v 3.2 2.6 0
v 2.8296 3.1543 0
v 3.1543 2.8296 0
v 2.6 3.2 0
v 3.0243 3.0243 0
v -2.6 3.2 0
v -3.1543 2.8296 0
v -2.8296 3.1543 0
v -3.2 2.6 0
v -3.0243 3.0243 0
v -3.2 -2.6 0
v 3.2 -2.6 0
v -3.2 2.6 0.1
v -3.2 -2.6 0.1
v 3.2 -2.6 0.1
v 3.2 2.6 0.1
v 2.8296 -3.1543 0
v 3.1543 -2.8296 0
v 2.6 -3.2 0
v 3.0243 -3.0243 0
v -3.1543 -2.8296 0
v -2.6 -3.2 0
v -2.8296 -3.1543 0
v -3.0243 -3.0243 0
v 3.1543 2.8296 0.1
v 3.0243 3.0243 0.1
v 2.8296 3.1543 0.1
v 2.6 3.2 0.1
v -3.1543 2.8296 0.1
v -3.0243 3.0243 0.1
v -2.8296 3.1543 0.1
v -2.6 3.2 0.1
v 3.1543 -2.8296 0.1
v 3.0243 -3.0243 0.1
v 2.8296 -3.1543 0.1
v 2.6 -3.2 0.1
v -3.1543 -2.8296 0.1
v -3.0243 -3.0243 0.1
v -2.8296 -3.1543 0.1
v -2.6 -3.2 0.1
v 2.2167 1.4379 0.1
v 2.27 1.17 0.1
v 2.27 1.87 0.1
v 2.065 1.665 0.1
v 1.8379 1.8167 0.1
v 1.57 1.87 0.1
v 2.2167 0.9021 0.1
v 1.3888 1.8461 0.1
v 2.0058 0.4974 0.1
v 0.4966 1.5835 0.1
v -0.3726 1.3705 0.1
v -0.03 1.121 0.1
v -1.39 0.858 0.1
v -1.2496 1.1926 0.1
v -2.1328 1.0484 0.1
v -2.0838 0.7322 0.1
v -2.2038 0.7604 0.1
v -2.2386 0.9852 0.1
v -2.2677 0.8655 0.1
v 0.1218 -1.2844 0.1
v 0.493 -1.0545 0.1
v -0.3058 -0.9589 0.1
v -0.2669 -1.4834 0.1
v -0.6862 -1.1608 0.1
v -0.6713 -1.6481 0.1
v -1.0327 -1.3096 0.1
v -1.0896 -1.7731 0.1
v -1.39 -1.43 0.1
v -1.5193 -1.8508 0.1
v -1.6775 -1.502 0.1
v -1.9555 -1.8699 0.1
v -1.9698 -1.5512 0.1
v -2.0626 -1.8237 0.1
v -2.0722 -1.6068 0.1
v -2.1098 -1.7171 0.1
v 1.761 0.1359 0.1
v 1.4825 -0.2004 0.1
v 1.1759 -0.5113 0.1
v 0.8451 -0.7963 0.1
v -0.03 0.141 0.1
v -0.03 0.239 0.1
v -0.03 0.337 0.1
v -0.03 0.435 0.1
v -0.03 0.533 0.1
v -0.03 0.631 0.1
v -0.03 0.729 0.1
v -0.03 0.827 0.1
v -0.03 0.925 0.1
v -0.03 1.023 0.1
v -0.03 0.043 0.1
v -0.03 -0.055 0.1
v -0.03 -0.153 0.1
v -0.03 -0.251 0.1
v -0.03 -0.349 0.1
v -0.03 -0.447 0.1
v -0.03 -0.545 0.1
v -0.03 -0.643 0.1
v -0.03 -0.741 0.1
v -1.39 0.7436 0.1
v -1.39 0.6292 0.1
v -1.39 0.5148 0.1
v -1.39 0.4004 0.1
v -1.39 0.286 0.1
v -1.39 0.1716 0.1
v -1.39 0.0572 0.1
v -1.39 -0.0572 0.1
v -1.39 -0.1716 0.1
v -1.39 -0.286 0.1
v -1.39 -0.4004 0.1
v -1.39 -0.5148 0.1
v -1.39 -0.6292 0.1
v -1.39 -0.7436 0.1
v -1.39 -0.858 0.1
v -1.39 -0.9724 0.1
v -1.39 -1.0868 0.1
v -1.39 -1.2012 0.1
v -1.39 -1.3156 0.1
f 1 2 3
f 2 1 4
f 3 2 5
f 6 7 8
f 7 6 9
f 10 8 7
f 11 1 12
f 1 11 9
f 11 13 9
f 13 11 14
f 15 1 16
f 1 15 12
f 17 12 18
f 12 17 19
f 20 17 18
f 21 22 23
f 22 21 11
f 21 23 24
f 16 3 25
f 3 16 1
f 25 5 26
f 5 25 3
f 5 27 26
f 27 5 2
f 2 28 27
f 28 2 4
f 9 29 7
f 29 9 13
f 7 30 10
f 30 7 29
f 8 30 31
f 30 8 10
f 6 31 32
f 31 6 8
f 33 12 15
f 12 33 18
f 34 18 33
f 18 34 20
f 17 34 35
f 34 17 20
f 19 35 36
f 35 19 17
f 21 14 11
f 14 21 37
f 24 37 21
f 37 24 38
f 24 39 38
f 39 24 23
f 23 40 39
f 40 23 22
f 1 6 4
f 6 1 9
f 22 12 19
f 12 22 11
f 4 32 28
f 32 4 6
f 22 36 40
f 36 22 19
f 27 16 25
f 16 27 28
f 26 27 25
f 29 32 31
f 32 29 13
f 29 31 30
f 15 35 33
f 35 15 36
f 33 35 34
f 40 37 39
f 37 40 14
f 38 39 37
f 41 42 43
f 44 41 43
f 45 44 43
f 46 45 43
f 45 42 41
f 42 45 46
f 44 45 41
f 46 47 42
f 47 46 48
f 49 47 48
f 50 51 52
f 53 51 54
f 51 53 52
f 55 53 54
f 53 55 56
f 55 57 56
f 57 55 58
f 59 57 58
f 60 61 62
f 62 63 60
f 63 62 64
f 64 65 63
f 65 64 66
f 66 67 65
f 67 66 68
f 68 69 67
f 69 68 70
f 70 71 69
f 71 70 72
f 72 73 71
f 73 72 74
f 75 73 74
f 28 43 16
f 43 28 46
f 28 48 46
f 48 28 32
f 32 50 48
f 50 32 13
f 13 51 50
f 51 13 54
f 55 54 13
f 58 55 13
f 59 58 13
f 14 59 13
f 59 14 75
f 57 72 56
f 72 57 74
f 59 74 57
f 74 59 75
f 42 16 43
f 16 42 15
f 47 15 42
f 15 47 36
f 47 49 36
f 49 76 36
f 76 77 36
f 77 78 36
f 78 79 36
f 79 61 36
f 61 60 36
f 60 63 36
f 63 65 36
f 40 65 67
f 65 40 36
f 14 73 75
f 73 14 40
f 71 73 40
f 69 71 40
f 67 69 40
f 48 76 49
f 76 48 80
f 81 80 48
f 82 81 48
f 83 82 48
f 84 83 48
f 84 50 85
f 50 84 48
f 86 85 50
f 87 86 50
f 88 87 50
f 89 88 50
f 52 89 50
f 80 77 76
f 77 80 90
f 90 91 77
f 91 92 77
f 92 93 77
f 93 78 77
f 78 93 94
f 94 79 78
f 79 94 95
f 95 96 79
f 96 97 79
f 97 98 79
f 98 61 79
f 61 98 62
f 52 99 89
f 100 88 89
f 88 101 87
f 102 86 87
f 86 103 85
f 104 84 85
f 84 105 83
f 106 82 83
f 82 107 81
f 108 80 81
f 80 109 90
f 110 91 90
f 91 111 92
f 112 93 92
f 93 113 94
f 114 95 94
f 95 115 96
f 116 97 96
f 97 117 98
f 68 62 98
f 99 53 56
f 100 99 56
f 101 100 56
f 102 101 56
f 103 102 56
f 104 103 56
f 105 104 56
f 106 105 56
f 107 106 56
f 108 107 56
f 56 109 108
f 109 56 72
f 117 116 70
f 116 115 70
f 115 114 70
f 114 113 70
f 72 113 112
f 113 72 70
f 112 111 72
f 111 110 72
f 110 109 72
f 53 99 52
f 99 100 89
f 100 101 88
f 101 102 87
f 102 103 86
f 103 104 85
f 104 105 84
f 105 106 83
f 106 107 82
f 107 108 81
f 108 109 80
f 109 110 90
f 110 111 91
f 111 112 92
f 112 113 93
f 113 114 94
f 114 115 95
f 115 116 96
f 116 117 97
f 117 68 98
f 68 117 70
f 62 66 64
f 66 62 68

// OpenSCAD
// file: ../p/box3u12.scad
use <../lib.scad>
function ldraw_lib__box3u12() = [
// 0 Box with 3 Parallel Faces without Any Edges
// 0 Name: box3u12.dat
// 0 Author: J.C. Tchang [tchang]
// 0 !LDRAW_ORG Primitive UPDATE 2014-02
// 0 !LICENSE Licensed under CC BY 4.0 : see CAreadme.txt
// 
// 0 BFC CERTIFY CCW
  [0,"BFC","CERTIFY"],
  [0,"BFC","CCW"],
// 
// 0 !HISTORY 2014-12-23 [PTadmin] Official Update 2014-02
// 
// 
// 4 16 -1 1 1 1 1 1 1 1 -1 -1 1 -1
  [4,16,-1,1,1,1,1,1,1,1,-1,-1,1,-1],
// 4 16 -1 1 1 -1 0 1 1 0 1 1 1 1
  [4,16,-1,1,1,-1,0,1,1,0,1,1,1,1],
// 4 16 1 1 -1 1 0 -1 -1 0 -1 -1 1 -1
  [4,16,1,1,-1,1,0,-1,-1,0,-1,-1,1,-1],
];
module ldraw_lib__box3u12(step=0, col=false, unit=2/5, alt=false, line=0.2, solid=!$preview)
    makepoly(ldraw_lib__box3u12(), step=step, col=col, unit=unit, alt=alt, line=line, solid=solid);
ldraw_lib__box3u12(line=0.2);
// file: ../p/1-4cyli.scad
use <../lib.scad>
function ldraw_lib__1_4cyli() = [
// 0 Cylinder 0.25
// 0 Name: 1-4cyli.dat
// 0 Author: James Jessiman
// 0 !LDRAW_ORG Primitive UPDATE 2012-01
// 0 !LICENSE Licensed under CC BY 4.0 : see CAreadme.txt
// 
// 0 BFC CERTIFY CCW
  [0,"BFC","CERTIFY"],
  [0,"BFC","CCW"],
// 
// 0 !HISTORY 2002-03-23 [sbliss] Added BFC statement.
// 0 !HISTORY 2002-04-25 [PTadmin] Official Update 2002-02
// 0 !HISTORY 2007-06-22 [PTadmin] Header formatted for Contributor Agreement
// 0 !HISTORY 2008-07-01 [PTadmin] Official Update 2008-01
// 0 !HISTORY 2012-02-16 [Philo] Changed to CCW
// 0 !HISTORY 2012-03-30 [PTadmin] Official Update 2012-01
// 
// 
// 4 16 1 1 0 0.9239 1 0.3827 0.9239 0 0.3827 1 0 0
  [4,16,1,1,0,0.9239,1,0.3827,0.9239,0,0.3827,1,0,0],
// 5 24 1 0 0 1 1 0 0.9239 0 0.3827 1 0 -1
  [5,24,1,0,0,1,1,0,0.9239,0,0.3827,1,0,-1],
// 4 16 0.9239 1 0.3827 0.7071 1 0.7071 0.7071 0 0.7071 0.9239 0 0.3827
  [4,16,0.9239,1,0.3827,0.7071,1,0.7071,0.7071,0,0.7071,0.9239,0,0.3827],
// 5 24 0.9239 0 0.3827 0.9239 1 0.3827 0.7071 0 0.7071 1 0 0
  [5,24,0.9239,0,0.3827,0.9239,1,0.3827,0.7071,0,0.7071,1,0,0],
// 4 16 0.7071 1 0.7071 0.3827 1 0.9239 0.3827 0 0.9239 0.7071 0 0.7071
  [4,16,0.7071,1,0.7071,0.3827,1,0.9239,0.3827,0,0.9239,0.7071,0,0.7071],
// 5 24 0.7071 0 0.7071 0.7071 1 0.7071 0.3827 0 0.9239 0.9239 0 0.3827
  [5,24,0.7071,0,0.7071,0.7071,1,0.7071,0.3827,0,0.9239,0.9239,0,0.3827],
// 4 16 0.3827 1 0.9239 0 1 1 0 0 1 0.3827 0 0.9239
  [4,16,0.3827,1,0.9239,0,1,1,0,0,1,0.3827,0,0.9239],
// 5 24 0.3827 0 0.9239 0.3827 1 0.9239 0 0 1 0.7071 0 0.7071
  [5,24,0.3827,0,0.9239,0.3827,1,0.9239,0,0,1,0.7071,0,0.7071],
// 5 24 0 0 1 0 1 1 0.3827 0 0.9239 -1 0 1
  [5,24,0,0,1,0,1,1,0.3827,0,0.9239,-1,0,1],
];
module ldraw_lib__1_4cyli(step=0, col=false, unit=2/5, alt=false, line=0.2, solid=!$preview)
    makepoly(ldraw_lib__1_4cyli(), step=step, col=col, unit=unit, alt=alt, line=line, solid=solid);
ldraw_lib__1_4cyli(line=0.2);
// file: s/stickerback008x008.scad
use <../../lib.scad>
use <../../p/1-4chrd.scad>
use <../../p/1-4cyli.scad>
use <../../p/box3u12.scad>
function ldraw_lib__s__stickerback008x008() = [
// 0 ~Sticker Back  0.8 x  0.8
// 0 Name: s\stickerback008x008.dat
// 0 Author: Massimo Maso [Sirio]
// 0 !LDRAW_ORG Subpart UPDATE 2025-08
// 0 !LICENSE Licensed under CC BY 4.0 : see CAreadme.txt
// 
// 0 BFC CERTIFY CCW
  [0,"BFC","CERTIFY"],
  [0,"BFC","CCW"],
// 
// 0 !HISTORY 2025-08-31 [OrionP] Official Update 2025-08
// 
// 0 // Primitives
// 1 16 -6.5 0 6.5 -1.5 0 0 0 -1 0 0 0 1.5 1-4chrd.dat
  [1,16,-6.5,0,6.5,-1.5,0,0,0,-1,0,0,0,1.5, ldraw_lib__1_4chrd()],
// 1 16 6.5 0 6.5 1.5 0 0 0 -1 0 0 0 1.5 1-4chrd.dat
  [1,16,6.5,0,6.5,1.5,0,0,0,-1,0,0,0,1.5, ldraw_lib__1_4chrd()],
// 1 16 0 -.25 0 0 0 8 0 .25 0 6.5 0 0 box3u12.dat
  [1,16,0,-.25,0,0,0,8,0,.25,0,6.5,0,0, ldraw_lib__box3u12()],
// 1 16 -6.5 0 -6.5 -1.5 0 0 0 -1 0 0 0 -1.5 1-4chrd.dat
  [1,16,-6.5,0,-6.5,-1.5,0,0,0,-1,0,0,0,-1.5, ldraw_lib__1_4chrd()],
// 1 16 6.5 0 -6.5 1.5 0 0 0 -1 0 0 0 -1.5 1-4chrd.dat
  [1,16,6.5,0,-6.5,1.5,0,0,0,-1,0,0,0,-1.5, ldraw_lib__1_4chrd()],
// 1 16 -6.5 0 6.5 -1.5 0 0 0 -.25 0 0 0 1.5 1-4cyli.dat
  [1,16,-6.5,0,6.5,-1.5,0,0,0,-.25,0,0,0,1.5, ldraw_lib__1_4cyli()],
// 1 16 6.5 0 6.5 1.5 0 0 0 -.25 0 0 0 1.5 1-4cyli.dat
  [1,16,6.5,0,6.5,1.5,0,0,0,-.25,0,0,0,1.5, ldraw_lib__1_4cyli()],
// 1 16 -6.5 0 -6.5 -1.5 0 0 0 -.25 0 0 0 -1.5 1-4cyli.dat
  [1,16,-6.5,0,-6.5,-1.5,0,0,0,-.25,0,0,0,-1.5, ldraw_lib__1_4cyli()],
// 1 16 6.5 0 -6.5 1.5 0 0 0 -.25 0 0 0 -1.5 1-4cyli.dat
  [1,16,6.5,0,-6.5,1.5,0,0,0,-.25,0,0,0,-1.5, ldraw_lib__1_4cyli()],
// 0 // Bottom faces
// 4 16 -8 0 6.5 -6.5 0 8 6.5 0 8 8 0 6.5
  [4,16,-8,0,6.5,-6.5,0,8,6.5,0,8,8,0,6.5],
// 4 16 -8 0 -6.5 8 0 -6.5 6.5 0 -8 -6.5 0 -8
  [4,16,-8,0,-6.5,8,0,-6.5,6.5,0,-8,-6.5,0,-8],
// 0 // Lateral faces
// 4 16 -6.5 0 8 -6.5 -.25 8 6.5 -.25 8 6.5 0 8
  [4,16,-6.5,0,8,-6.5,-.25,8,6.5,-.25,8,6.5,0,8],
// 4 16 -6.5 0 -8 6.5 0 -8 6.5 -.25 -8 -6.5 -.25 -8
  [4,16,-6.5,0,-8,6.5,0,-8,6.5,-.25,-8,-6.5,-.25,-8],
];
module ldraw_lib__s__stickerback008x008(step=0, col=false, unit=2/5, alt=false, line=0.2, solid=!$preview)
    makepoly(ldraw_lib__s__stickerback008x008(), step=step, col=col, unit=unit, alt=alt, line=line, solid=solid);
ldraw_lib__s__stickerback008x008(line=0.2);
// file: ../p/1-4ndis.scad
use <../lib.scad>
function ldraw_lib__1_4ndis() = [
// 0 Disc Negative 0.25
// 0 Name: 1-4ndis.dat
// 0 Author: James Jessiman
// 0 !LDRAW_ORG Primitive UPDATE 2012-01
// 0 !LICENSE Licensed under CC BY 4.0 : see CAreadme.txt
// 
// 0 BFC CERTIFY CCW
  [0,"BFC","CERTIFY"],
  [0,"BFC","CCW"],
// 
// 0 !HISTORY 2002-03-23 [sbliss] Added BFC Statement
// 0 !HISTORY 2002-04-25 [PTadmin] Official Update 2002-02
// 0 !HISTORY 2007-06-22 [PTadmin] Header formatted for Contributor Agreement
// 0 !HISTORY 2008-07-01 [PTadmin] Official Update 2008-01
// 0 !HISTORY 2012-02-16 [Philo] Changed to CCW
// 0 !HISTORY 2012-03-30 [PTadmin] Official Update 2012-01
// 
// 
// 3 16 0.9239 0 0.3827 1 0 0 1 0 1
  [3,16,0.9239,0,0.3827,1,0,0,1,0,1],
// 3 16 0.7071 0 0.7071 0.9239 0 0.3827 1 0 1
  [3,16,0.7071,0,0.7071,0.9239,0,0.3827,1,0,1],
// 3 16 0.3827 0 0.9239 0.7071 0 0.7071 1 0 1
  [3,16,0.3827,0,0.9239,0.7071,0,0.7071,1,0,1],
// 3 16 0 0 1 0.3827 0 0.9239 1 0 1
  [3,16,0,0,1,0.3827,0,0.9239,1,0,1],
];
module ldraw_lib__1_4ndis(step=0, col=false, unit=2/5, alt=false, line=0.2, solid=!$preview)
    makepoly(ldraw_lib__1_4ndis(), step=step, col=col, unit=unit, alt=alt, line=line, solid=solid);
ldraw_lib__1_4ndis(line=0.2);
// file: ../p/1-4chrd.scad
use <../lib.scad>
function ldraw_lib__1_4chrd() = [
// 0 Chord 0.25
// 0 Name: 1-4chrd.dat
// 0 Author: Max Martin Richter [MMR1988]
// 0 !LDRAW_ORG Primitive UPDATE 2023-05
// 0 !LICENSE Licensed under CC BY 4.0 : see CAreadme.txt
// 
// 0 BFC CERTIFY CCW
  [0,"BFC","CERTIFY"],
  [0,"BFC","CCW"],
// 
// 0 !HISTORY 2004-04-22 [PTadmin] Official Update 2004-02
// 0 !HISTORY 2007-10-09 [PTadmin] Header formatted for Contributor Agreement
// 0 !HISTORY 2008-07-01 [PTadmin] Official Update 2008-01
// 0 !HISTORY 2012-08-02 [MMR1988] Re-creation with PrimGen2 and Rectifier
// 0 !HISTORY 2012-08-09 [PTadmin] Official Update 2012-02
// 0 !HISTORY 2023-10-27 [OrionP] Change author to MMR1988 from hafhead
// 0 !HISTORY 2023-10-31 [OrionP] Official Update 2023-05
// 
// 4 16 0.9239 0 0.3827 0.3827 0 0.9239 0 0 1 1 0 0
  [4,16,0.9239,0,0.3827,0.3827,0,0.9239,0,0,1,1,0,0],
// 3 16 0.7071 0 0.7071 0.3827 0 0.9239 0.9239 0 0.3827
  [3,16,0.7071,0,0.7071,0.3827,0,0.9239,0.9239,0,0.3827],
];
module ldraw_lib__1_4chrd(step=0, col=false, unit=2/5, alt=false, line=0.2, solid=!$preview)
    makepoly(ldraw_lib__1_4chrd(), step=step, col=col, unit=unit, alt=alt, line=line, solid=solid);
ldraw_lib__1_4chrd(line=0.2);
// main file
use <../lib.scad>
use <6177960g.scad>
function ldraw_lib__6177960j() = [
// 0 Sticker  0.8 x  0.8 with Black Air Vent on Orange Background Left
// 0 Name: 6177960j.dat
// 0 Author: Massimo Maso [Sirio]
// 0 !LDRAW_ORG Part UPDATE 2025-08
// 0 !LICENSE Licensed under CC BY 4.0 : see CAreadme.txt
// 
// 0 BFC CERTIFY CCW
  [0,"BFC","CERTIFY"],
  [0,"BFC","CCW"],
// 
// 0 !KEYWORDS 720S, McLaren, Set 75880, Speed Champions
// 
// 0 !HISTORY 2025-08-31 [OrionP] Official Update 2025-08
// 
// 
// 1 16 0 0 0 -1 0 0 0 1 0 0 0 1 6177960g.dat
  [1,16,0,0,0,-1,0,0,0,1,0,0,0,1, ldraw_lib__6177960g()],
];
module ldraw_lib__6177960j(step=0, col=false, unit=2/5, alt=false, line=0.2, solid=!$preview)
    makepoly(ldraw_lib__6177960j(), step=step, col=col, unit=unit, alt=alt, line=line, solid=solid);
ldraw_lib__6177960j(line=0.2);
